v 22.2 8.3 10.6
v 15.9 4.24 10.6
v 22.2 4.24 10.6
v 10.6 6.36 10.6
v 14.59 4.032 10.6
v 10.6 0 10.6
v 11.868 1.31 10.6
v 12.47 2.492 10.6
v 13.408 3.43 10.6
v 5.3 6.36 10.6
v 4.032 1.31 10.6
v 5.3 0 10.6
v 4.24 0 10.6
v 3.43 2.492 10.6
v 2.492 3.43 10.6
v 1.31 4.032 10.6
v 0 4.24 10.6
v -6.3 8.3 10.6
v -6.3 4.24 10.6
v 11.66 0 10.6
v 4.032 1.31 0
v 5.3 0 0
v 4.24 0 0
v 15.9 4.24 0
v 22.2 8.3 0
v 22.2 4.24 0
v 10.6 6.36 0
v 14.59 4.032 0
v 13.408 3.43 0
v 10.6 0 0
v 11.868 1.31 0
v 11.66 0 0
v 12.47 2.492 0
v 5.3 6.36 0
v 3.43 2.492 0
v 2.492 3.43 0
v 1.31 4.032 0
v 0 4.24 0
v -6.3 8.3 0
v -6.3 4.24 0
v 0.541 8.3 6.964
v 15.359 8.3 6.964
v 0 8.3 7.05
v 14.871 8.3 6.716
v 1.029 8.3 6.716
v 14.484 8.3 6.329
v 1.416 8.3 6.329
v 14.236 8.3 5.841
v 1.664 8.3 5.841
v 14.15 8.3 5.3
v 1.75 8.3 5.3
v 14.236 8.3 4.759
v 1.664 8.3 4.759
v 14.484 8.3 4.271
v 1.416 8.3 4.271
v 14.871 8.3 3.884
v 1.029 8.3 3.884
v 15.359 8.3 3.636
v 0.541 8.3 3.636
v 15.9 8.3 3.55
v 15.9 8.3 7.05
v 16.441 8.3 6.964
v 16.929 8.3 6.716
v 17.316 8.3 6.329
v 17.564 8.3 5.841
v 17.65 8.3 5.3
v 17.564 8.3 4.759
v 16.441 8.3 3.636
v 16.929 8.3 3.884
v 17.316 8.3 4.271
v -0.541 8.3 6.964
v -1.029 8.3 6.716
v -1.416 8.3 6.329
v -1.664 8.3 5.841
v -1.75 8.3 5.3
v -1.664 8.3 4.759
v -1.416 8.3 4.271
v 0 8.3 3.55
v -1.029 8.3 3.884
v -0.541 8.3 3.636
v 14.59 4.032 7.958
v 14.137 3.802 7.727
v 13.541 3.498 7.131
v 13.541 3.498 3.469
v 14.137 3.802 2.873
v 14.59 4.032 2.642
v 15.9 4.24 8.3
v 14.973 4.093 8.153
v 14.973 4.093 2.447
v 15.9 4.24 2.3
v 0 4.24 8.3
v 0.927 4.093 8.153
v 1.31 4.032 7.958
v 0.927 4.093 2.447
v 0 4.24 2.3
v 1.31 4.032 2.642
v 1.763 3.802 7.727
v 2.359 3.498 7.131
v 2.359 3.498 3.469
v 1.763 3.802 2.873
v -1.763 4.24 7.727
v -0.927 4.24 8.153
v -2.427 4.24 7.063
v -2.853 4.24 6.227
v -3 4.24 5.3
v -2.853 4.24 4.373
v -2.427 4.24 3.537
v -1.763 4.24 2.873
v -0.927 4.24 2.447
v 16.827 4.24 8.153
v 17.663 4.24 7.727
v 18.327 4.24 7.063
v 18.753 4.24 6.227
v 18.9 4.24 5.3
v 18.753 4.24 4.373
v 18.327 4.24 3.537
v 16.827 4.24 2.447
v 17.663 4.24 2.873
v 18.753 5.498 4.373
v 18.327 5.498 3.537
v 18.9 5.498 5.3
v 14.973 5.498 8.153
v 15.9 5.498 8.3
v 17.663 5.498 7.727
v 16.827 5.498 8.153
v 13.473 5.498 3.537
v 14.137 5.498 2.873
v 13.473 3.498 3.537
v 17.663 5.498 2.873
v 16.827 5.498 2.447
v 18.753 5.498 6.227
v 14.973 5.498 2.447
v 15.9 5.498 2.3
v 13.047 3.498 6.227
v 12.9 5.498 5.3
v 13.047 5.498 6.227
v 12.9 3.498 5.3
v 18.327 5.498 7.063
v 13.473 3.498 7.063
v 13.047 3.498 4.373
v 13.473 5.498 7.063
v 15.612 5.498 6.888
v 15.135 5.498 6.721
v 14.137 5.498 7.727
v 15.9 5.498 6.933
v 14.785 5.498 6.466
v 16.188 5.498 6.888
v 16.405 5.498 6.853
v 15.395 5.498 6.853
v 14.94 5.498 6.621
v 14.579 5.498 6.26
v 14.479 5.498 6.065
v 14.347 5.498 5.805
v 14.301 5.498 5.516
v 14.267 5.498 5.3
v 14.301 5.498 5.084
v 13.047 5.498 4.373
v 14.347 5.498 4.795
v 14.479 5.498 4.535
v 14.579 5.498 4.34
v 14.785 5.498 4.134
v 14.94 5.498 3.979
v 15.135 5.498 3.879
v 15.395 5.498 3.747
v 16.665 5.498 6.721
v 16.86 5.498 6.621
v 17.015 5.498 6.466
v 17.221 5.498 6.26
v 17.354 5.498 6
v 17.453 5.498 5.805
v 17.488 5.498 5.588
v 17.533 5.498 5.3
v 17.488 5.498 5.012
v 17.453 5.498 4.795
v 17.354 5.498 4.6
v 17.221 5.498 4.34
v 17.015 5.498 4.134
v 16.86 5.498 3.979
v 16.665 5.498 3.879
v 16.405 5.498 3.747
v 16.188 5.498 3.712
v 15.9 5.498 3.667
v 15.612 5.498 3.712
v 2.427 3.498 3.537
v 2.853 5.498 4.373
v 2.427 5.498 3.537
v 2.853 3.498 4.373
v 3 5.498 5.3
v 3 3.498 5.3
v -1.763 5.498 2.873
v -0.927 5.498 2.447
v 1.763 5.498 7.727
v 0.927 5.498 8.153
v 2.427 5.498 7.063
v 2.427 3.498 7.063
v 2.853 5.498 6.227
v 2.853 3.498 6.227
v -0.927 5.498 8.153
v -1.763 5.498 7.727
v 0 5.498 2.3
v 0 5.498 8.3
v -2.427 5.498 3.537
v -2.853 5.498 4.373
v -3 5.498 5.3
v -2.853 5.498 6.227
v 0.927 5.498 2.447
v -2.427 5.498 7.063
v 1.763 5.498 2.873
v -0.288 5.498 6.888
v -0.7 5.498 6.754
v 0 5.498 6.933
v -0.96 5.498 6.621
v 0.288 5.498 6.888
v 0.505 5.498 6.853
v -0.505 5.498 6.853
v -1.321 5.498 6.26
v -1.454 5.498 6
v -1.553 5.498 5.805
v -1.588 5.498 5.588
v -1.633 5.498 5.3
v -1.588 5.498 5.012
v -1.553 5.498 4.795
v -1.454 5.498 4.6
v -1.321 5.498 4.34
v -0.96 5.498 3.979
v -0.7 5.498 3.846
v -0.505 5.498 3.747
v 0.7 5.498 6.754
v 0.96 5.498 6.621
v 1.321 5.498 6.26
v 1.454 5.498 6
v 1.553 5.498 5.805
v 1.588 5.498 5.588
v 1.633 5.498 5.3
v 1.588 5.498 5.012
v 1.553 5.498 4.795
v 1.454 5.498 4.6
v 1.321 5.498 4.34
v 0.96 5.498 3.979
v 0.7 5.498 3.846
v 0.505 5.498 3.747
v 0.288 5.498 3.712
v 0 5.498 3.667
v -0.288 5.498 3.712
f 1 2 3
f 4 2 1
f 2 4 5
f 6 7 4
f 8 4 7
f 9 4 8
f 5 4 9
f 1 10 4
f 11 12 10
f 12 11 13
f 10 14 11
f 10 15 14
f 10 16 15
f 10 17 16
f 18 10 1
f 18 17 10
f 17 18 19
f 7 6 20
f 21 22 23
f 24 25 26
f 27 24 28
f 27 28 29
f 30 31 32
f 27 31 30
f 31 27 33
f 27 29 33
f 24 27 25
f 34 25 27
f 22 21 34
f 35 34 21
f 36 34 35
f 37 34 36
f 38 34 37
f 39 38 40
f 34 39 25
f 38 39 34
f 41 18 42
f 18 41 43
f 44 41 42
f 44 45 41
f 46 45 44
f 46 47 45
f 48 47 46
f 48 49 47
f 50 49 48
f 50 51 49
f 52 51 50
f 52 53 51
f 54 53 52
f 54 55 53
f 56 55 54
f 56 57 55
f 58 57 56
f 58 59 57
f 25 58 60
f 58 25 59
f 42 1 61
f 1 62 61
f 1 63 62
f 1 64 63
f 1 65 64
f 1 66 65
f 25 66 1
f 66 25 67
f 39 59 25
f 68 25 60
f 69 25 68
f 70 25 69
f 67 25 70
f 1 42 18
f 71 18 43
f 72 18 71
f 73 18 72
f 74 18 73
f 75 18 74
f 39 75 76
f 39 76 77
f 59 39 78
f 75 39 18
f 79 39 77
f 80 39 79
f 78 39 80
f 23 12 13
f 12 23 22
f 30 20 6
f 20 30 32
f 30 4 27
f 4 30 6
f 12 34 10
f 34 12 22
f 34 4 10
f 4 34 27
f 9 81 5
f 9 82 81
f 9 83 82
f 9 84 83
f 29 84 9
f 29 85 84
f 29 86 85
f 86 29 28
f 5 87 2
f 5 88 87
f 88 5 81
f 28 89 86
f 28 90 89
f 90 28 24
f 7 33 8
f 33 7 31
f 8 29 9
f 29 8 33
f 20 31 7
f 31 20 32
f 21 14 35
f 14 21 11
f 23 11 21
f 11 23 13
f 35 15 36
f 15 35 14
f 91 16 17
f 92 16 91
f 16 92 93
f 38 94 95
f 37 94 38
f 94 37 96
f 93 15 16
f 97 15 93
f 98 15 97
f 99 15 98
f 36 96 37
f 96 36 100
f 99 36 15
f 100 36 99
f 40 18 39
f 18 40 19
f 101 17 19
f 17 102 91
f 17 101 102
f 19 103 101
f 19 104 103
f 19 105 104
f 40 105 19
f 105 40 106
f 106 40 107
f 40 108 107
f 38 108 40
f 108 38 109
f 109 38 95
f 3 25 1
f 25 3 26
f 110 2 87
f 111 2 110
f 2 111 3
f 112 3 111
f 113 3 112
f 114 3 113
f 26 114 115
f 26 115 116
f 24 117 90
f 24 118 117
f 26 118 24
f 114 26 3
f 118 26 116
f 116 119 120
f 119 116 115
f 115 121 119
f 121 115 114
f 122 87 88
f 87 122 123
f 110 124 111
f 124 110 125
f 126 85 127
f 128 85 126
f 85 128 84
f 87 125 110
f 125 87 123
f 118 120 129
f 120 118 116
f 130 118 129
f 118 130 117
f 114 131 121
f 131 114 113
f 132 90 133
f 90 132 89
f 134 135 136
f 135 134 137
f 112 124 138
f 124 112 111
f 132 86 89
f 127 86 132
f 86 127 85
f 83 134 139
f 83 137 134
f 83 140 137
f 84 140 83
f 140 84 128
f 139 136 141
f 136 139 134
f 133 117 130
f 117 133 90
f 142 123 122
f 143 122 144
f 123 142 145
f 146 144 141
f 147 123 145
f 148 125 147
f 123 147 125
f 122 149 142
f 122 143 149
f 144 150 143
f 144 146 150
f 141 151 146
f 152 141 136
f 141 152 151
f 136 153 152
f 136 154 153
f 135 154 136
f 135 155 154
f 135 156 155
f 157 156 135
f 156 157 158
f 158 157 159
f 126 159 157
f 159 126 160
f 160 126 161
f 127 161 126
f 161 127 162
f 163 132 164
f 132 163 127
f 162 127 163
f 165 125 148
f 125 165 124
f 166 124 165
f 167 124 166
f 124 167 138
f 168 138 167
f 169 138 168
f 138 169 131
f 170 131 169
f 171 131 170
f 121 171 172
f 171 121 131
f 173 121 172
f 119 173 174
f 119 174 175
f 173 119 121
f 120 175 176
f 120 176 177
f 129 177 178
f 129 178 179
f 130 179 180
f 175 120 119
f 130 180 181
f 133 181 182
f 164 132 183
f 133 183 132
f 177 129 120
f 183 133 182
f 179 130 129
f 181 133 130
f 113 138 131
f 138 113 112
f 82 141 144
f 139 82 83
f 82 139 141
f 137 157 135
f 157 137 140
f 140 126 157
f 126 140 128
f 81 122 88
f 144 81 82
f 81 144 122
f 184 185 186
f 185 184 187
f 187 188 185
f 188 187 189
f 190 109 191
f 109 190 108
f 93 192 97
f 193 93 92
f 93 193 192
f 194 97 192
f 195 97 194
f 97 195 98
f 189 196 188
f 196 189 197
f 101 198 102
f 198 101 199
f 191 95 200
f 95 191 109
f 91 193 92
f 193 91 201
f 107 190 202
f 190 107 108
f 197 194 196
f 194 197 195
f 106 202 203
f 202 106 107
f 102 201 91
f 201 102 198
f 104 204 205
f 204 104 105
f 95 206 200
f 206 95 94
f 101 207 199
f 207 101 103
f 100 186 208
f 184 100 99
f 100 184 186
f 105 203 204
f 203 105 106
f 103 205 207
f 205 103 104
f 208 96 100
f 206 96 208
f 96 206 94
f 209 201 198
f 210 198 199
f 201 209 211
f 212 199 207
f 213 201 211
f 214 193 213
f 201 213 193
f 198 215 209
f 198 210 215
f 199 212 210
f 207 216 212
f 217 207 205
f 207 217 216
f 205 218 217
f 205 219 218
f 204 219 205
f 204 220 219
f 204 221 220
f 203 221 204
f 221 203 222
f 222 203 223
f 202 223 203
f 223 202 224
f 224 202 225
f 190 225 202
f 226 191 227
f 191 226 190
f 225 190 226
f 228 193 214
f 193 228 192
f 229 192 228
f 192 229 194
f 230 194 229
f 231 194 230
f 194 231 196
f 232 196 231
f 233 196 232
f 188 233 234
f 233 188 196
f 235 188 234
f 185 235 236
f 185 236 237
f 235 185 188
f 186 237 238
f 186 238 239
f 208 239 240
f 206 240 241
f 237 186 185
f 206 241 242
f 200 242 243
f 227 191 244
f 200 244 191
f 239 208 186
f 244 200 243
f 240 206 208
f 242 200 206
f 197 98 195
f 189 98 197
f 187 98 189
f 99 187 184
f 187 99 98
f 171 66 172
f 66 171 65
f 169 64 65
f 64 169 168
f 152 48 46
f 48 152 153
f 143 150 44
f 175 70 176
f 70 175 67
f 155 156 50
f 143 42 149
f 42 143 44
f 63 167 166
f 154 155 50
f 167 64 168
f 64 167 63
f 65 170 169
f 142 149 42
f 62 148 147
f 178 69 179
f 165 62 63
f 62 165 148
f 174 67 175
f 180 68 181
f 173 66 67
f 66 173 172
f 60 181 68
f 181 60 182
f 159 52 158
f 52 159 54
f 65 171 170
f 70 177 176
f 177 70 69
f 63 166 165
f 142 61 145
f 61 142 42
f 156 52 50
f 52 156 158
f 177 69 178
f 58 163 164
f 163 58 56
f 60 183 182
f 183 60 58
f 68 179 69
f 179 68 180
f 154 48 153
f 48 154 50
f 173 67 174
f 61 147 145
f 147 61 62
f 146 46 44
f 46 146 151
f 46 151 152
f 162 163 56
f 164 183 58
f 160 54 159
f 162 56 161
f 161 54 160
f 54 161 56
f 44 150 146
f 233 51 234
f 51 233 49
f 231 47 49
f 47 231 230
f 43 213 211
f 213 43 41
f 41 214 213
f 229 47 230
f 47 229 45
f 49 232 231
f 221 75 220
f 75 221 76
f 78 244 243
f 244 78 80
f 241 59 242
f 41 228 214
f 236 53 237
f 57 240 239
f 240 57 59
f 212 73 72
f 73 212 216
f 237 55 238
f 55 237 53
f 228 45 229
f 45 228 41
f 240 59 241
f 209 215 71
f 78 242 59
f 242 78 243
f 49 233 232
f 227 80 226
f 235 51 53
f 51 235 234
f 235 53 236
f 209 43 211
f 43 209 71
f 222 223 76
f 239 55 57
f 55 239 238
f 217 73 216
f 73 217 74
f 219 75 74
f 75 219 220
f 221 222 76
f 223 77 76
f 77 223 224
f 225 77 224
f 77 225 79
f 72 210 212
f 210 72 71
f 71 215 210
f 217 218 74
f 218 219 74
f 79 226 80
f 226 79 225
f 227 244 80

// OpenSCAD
DividerWidth = 5.3;
HasPlugs = true;
BaseWidth = DividerWidth * 3;
TotalHeight = DividerWidth*2;
BaseHeight = 3;
DividerHeight = DividerWidth;
WallThickness = 1.4;

$fn=20;
difference(){    
    union(){        
        difference(){
            //initial "cube" to create plywood cutout and "ramps"
            cube([BaseWidth,DividerWidth+BaseHeight,TotalHeight]);
            //cutout for plywood
            translate([DividerWidth,-DividerWidth*.2,0]) {
                cube([DividerWidth,DividerWidth*1.4,TotalHeight],center=false);
                
            }
            
            //carve out "ramps"
            translate([BaseWidth,0,0]) {
                cylinder(TotalHeight*1.1,DividerWidth*.8,DividerWidth*.8,center=false);         
            }                     
           cylinder(TotalHeight*1.1,DividerWidth*.8,DividerWidth*.8,center=false);
        }
      //extend base
        union(){
            translate([-DividerWidth-1,DividerWidth*.8,0]){
               cube([DividerWidth+1,DividerWidth*.2+BaseHeight,TotalHeight]);
            }
            translate([BaseWidth,DividerWidth*.8,]){
                cube([DividerWidth+1,DividerWidth*.2+BaseHeight,TotalHeight]);
            }
        }    
    }
    //two screw countersinks
    translate([BaseWidth,DividerWidth*0.66,TotalHeight/2])rotate([-90,0,0]) {
         cylinder(2,3,3); 
    }
    translate([0,DividerWidth*0.66,TotalHeight/2])rotate([-90,0,0]) {
         cylinder(2,3,3);     
    } 
    //pilot holes
    translate([BaseWidth,DividerWidth+BaseHeight,TotalHeight/2])rotate([90,0,0]) {
        cylinder(BaseHeight*2,1.75,1.5);        
    }   
    translate([0,DividerWidth+BaseHeight,TotalHeight/2])rotate([90,0,0]) {
        cylinder(BaseHeight*2,1.75,1.5);        
    }   
}
module screw_countersunk(
        l=20,   //length
        dh = 6,   //head dia
        lh = 3,   //head length
        ds = 2.5,  //shaft dia
        )
{
    union() {
        cylinder(h=lh, r1=dh/2, r2=ds/2, $fn=20);
        polyhole(h=l, d=ds);
    }
}
